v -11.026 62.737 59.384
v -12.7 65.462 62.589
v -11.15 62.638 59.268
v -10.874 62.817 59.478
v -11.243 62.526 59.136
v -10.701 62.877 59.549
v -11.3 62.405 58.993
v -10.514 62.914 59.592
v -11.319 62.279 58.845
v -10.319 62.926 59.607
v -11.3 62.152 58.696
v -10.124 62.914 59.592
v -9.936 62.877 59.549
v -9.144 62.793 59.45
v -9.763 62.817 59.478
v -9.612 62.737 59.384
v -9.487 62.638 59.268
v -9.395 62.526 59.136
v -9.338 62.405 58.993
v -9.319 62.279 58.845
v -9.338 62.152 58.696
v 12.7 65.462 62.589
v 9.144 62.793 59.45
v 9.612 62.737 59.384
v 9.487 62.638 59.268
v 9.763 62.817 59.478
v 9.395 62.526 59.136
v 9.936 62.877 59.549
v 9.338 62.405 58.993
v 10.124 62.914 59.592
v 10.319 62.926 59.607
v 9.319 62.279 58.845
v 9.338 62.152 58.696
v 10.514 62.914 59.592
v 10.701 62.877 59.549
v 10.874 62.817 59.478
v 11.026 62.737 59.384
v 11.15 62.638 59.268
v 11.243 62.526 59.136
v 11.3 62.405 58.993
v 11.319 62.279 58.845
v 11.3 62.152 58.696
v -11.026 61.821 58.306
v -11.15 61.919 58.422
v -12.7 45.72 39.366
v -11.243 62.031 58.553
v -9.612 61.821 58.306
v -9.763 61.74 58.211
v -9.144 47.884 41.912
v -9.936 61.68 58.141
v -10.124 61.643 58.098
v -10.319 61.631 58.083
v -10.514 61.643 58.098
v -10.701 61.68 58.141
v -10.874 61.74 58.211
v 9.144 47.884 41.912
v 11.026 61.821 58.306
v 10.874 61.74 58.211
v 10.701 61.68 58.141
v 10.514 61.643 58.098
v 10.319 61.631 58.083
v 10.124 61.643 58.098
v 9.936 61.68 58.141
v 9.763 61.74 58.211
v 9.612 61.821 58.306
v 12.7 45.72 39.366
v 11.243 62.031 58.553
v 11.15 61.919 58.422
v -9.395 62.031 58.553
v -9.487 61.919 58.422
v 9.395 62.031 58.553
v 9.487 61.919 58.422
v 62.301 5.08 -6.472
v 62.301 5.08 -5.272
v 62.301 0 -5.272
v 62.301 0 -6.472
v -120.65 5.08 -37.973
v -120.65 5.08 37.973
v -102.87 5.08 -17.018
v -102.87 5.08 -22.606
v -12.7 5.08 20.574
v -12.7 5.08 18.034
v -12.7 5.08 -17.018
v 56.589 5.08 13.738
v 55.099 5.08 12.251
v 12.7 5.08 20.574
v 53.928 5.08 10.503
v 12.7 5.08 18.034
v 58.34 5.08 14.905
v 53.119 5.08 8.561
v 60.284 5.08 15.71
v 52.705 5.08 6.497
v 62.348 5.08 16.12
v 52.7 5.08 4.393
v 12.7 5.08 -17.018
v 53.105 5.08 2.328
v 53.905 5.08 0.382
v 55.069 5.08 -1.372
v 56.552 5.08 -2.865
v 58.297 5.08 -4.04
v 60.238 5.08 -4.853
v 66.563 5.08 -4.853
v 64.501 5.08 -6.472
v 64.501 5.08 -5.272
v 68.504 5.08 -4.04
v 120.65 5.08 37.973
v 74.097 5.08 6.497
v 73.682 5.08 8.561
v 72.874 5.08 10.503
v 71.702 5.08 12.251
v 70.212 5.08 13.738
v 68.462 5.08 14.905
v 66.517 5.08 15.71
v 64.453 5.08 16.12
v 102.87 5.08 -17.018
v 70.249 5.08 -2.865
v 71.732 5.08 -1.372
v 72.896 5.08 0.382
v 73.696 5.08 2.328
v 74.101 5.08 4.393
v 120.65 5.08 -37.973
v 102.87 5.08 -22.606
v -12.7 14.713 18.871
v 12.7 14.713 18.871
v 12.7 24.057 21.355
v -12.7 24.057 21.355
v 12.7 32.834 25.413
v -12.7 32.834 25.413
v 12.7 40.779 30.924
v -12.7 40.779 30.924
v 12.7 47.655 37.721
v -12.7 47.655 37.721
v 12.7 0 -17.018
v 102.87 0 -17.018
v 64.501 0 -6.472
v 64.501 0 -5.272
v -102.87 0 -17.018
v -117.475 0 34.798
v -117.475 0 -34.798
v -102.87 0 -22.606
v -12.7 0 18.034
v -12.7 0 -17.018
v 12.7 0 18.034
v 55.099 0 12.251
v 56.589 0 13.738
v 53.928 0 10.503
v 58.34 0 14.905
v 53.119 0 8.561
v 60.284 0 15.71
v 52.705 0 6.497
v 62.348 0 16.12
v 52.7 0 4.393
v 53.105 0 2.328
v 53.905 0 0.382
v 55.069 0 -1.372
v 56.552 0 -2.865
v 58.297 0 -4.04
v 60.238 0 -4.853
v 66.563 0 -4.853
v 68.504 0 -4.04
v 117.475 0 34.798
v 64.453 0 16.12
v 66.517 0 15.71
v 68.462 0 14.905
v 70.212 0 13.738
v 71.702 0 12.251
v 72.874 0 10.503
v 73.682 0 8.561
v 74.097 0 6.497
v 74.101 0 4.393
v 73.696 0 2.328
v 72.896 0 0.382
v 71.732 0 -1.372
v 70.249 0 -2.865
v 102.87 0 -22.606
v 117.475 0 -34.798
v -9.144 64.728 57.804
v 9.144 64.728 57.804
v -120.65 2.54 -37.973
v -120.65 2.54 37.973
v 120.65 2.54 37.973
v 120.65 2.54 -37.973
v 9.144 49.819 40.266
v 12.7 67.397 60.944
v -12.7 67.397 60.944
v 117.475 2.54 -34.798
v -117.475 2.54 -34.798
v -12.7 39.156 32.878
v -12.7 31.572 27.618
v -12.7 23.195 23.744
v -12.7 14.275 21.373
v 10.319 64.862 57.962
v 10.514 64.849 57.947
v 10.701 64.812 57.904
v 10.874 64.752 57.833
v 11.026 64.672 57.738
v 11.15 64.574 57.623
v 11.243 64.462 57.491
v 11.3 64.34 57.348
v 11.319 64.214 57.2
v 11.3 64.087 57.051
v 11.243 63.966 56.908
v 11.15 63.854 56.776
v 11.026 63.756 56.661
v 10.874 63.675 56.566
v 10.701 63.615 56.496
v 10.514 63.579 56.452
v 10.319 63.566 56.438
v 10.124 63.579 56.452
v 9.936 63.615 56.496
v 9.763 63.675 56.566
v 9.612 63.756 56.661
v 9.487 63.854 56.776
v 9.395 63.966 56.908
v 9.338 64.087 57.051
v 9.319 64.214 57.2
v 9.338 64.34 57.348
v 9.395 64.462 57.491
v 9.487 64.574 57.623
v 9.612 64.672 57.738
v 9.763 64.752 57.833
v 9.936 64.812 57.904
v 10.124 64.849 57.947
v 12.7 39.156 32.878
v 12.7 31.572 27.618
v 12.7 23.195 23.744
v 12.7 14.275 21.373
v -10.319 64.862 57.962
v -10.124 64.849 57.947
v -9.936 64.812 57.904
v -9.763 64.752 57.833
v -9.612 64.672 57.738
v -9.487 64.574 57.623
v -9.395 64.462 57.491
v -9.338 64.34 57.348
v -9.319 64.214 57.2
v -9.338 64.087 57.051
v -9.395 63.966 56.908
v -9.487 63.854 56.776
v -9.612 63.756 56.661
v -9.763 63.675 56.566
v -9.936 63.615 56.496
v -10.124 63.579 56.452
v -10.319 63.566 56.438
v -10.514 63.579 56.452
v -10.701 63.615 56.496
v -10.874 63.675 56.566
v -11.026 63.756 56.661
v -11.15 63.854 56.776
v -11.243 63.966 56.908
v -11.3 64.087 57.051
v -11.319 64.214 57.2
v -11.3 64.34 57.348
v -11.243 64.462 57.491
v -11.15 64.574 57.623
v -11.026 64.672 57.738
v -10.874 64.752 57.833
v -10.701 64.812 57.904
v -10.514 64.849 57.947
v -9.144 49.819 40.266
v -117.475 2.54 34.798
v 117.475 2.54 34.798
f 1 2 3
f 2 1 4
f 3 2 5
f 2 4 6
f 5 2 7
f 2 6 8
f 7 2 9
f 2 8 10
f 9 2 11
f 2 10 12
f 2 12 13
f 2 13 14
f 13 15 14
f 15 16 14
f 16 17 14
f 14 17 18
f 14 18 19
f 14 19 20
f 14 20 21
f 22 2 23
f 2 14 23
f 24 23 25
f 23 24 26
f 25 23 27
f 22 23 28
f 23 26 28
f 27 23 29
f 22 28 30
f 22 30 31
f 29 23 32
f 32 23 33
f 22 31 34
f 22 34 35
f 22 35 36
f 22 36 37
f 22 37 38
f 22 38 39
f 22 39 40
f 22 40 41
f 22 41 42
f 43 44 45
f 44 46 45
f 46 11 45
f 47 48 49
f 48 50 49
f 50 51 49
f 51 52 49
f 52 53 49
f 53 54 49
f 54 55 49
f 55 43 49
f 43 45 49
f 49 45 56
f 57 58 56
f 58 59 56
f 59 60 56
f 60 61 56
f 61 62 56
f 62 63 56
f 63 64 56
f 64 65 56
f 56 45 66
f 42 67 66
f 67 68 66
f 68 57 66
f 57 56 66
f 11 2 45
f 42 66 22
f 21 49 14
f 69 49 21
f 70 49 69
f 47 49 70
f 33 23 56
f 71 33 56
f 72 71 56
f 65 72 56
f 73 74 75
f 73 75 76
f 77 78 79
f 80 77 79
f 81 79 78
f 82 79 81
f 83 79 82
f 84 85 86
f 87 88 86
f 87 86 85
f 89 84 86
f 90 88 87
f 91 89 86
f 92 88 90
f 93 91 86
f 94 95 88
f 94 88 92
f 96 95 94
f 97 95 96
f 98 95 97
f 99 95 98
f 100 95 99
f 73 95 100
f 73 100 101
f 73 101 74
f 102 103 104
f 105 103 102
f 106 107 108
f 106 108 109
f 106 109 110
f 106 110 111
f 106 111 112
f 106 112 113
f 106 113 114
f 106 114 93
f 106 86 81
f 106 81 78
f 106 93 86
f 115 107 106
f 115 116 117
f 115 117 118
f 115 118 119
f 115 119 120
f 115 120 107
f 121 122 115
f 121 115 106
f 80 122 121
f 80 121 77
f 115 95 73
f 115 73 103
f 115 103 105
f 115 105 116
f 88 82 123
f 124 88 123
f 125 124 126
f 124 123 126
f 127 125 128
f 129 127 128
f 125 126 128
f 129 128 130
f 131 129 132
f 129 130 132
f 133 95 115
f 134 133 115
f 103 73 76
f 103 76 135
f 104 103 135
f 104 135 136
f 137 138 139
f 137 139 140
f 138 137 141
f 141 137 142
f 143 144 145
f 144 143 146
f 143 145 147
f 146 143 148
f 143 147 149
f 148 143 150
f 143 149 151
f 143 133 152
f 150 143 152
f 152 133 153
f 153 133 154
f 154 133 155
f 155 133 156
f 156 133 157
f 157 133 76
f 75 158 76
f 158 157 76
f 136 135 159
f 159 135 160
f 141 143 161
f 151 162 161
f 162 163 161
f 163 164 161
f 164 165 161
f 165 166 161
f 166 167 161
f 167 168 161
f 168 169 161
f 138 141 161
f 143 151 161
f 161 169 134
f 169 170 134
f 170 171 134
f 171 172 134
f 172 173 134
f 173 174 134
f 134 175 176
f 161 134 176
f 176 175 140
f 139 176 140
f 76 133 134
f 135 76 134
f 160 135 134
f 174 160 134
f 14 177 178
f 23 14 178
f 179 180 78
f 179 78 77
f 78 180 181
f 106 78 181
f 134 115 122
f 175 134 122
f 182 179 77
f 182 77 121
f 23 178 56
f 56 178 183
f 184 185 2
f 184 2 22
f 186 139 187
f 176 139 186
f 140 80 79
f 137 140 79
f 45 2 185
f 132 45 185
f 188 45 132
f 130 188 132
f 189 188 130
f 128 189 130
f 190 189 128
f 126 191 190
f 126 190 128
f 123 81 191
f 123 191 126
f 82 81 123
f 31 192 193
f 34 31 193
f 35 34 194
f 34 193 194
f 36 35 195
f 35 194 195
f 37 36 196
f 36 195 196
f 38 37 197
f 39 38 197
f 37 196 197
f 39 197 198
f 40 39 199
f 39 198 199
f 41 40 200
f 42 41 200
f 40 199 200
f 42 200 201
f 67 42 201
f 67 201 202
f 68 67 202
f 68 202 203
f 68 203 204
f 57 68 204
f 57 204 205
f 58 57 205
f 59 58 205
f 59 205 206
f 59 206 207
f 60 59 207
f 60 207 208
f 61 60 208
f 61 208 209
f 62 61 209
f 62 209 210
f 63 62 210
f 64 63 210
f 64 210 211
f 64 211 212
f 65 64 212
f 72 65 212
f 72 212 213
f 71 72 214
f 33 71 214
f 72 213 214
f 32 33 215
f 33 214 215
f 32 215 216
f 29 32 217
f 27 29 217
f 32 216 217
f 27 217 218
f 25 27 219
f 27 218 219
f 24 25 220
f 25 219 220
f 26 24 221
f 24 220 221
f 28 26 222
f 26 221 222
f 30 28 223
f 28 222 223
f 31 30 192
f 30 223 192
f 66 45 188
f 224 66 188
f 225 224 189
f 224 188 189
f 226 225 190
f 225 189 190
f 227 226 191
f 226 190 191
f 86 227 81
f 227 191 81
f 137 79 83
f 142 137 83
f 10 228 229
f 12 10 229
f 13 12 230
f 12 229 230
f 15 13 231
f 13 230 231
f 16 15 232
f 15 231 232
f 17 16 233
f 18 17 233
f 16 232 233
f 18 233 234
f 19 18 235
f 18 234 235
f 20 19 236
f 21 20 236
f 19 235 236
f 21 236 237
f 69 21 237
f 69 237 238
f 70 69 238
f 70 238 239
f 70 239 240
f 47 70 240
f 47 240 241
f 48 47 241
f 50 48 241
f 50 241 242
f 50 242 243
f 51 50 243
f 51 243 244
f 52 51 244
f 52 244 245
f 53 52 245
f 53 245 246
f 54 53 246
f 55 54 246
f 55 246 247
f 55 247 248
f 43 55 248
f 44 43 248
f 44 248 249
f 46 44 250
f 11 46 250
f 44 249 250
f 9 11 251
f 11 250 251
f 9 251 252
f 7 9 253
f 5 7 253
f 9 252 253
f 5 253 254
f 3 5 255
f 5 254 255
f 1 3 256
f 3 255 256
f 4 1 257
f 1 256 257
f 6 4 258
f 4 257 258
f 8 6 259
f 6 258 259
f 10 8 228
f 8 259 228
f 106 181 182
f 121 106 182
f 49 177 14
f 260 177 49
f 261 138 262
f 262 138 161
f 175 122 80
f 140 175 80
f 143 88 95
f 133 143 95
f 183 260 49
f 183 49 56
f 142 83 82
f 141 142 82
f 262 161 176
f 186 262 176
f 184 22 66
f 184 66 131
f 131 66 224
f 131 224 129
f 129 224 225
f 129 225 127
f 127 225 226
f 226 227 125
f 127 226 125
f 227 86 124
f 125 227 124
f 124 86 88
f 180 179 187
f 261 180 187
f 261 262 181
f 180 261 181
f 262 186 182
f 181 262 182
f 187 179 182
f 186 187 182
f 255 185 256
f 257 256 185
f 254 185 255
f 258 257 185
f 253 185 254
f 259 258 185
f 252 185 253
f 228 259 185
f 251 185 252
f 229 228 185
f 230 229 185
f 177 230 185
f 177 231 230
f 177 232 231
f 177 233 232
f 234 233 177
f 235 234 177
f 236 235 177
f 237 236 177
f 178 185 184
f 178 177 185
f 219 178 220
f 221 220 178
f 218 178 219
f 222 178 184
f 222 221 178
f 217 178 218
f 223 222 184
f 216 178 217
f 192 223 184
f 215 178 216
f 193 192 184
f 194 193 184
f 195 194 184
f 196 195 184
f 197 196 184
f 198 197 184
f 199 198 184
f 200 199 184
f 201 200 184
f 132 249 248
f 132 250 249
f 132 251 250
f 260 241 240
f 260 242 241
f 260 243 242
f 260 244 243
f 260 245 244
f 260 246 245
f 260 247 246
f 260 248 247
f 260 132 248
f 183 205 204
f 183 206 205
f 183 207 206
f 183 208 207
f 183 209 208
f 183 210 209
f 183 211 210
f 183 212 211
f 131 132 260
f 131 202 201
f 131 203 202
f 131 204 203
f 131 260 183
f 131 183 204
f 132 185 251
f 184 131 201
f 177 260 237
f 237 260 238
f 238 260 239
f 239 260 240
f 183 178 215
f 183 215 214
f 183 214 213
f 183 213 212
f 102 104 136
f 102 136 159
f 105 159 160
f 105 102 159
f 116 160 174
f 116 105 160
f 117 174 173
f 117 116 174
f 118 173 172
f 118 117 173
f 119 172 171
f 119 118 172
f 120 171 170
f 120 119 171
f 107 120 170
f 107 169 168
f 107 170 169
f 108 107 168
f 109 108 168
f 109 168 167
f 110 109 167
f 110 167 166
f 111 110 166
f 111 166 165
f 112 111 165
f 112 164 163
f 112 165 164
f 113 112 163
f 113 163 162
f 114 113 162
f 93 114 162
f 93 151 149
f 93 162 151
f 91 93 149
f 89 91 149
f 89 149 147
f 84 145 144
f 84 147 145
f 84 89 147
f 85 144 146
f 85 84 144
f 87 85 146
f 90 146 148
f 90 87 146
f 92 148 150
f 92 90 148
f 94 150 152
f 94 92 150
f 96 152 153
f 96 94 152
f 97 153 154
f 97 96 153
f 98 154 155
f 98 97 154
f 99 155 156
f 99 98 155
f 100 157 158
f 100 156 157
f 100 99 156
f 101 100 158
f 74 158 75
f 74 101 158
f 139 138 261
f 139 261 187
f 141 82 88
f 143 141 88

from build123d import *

# Parameters (mm, degrees)
SKETCH1_W                = 234.95
SKETCH1_H                = 69.596
BOSS_EXTRUDE1_DEPTH      = 2.54
SKETCH2_W                = 241.3
SKETCH2_H                = 75.946
BOSS_EXTRUDE2_DEPTH      = 2.54
SKETCH3_W                = 25.4
SKETCH3_H                = 4.572
SKETCH3_H_2              = 30.48
CUT_EXTRUDE2_DEPTH       = 127.5866408
BOSS_EXTRUDE7_DEPTH      = 12.7
BOSS_EXTRUDE7_DEPTH_BACK = 12.7
SKETCH5_W                = 25.4
SKETCH5_H                = 2.54
BOSS_EXTRUDE8_DEPTH      = 30.48
CUT_EXTRUDE3_REACH       = 153.329
SKETCH6_W                = 18.288
SKETCH6_H                = 23.01875
CUT_EXTRUDE4_REACH       = 153.329
SKETCH9_R                = 1
CUT_EXTRUDE6_REACH       = 151.523


with BuildPart() as part:
    # Sketch1 → Boss-Extrude1 (new body)
    with BuildSketch(Plane(origin=(0, 0, 0), x_dir=(1, 0, 0), z_dir=(0, 1, 0))):
        Rectangle(SKETCH1_W, SKETCH1_H)
    extrude(amount=BOSS_EXTRUDE1_DEPTH)

    # Sketch2 → Boss-Extrude2 (add)
    with BuildSketch(Plane(origin=(0, 2.54, 0), x_dir=(1, 0, 0), z_dir=(0, 1, 0))):
        Rectangle(SKETCH2_W, SKETCH2_H)
    extrude(amount=BOSS_EXTRUDE2_DEPTH)

    # Sketch3 → Cut-Extrude2 (cut, through all)
    with BuildSketch(Plane(origin=(0, 5.08, 0), x_dir=(1, 0, 0), z_dir=(0, 1, 0))):
        Polygon((102.87, 22.606), (-102.87, 22.606), (-102.87, 17.018), (-12.7, 17.018), (12.7, 17.018), (102.87, 17.018), align=None)
        with Locations((0, 14.732)):
            Rectangle(SKETCH3_W, SKETCH3_H)
        with Locations((0, -2.794)):
            Rectangle(SKETCH3_W, SKETCH3_H_2)
    extrude(amount=-CUT_EXTRUDE2_DEPTH, mode=Mode.SUBTRACT)

    # Sketch4 → Boss-Extrude7 (add, two sides: drawn at the far end of the back side and taken through both)
    with BuildSketch(Plane(origin=(0, 0, 0), x_dir=(0, 0, -1), z_dir=(1, 0, 0)).offset(-BOSS_EXTRUDE7_DEPTH_BACK)):
        with BuildLine():
            Line((-20.574, 5.08), (-18.034, 5.08))
            ThreePointArc((-18.034, 5.08), (-23.194025065, 28.533326897), (-37.721134665, 47.655238095))
            Line((-37.721134665, 47.655238095), (-39.366264908, 45.72))
            ThreePointArc((-39.366264908, 45.72), (-25.499478471, 27.467266584), (-20.574, 5.08))
        make_face()
    extrude(amount=BOSS_EXTRUDE7_DEPTH + BOSS_EXTRUDE7_DEPTH_BACK)

    # Sketch5 → Boss-Extrude8 (add)
    with BuildSketch(Plane(origin=(0, 38.605953422, 45.413858329), x_dir=(1, 0, 0), z_dir=(0, 0.6476890718445453, 0.7619047619047618))):
        with Locations((0, 10.607186134)):
            Rectangle(SKETCH5_W, SKETCH5_H)
    extrude(amount=BOSS_EXTRUDE8_DEPTH)

    # Sketch6 → Cut-Extrude3 (cut, up to next)
    with BuildSketch(Plane(origin=(0, 9.049284674, -7.692723663), x_dir=(1, 0, 0), z_dir=(0, 0.7619047619047616, -0.6476890718445452)), mode=Mode.PRIVATE) as cut_extrude3_sk1:
        with Locations((0, -74.455715595)):
            Rectangle(SKETCH6_W, SKETCH6_H)
    cut_extrude3_tool1 = extrude(cut_extrude3_sk1.sketch, amount=-CUT_EXTRUDE3_REACH, mode=Mode.PRIVATE) & part.part
    add(cut_extrude3_tool1.solids().sort_by_distance((0, 57.273438, 49.035441))[0], mode=Mode.SUBTRACT)

    # Sketch9 → Cut-Extrude4 (cut, up to next)
    with BuildSketch(Plane(origin=(0, 9.049284674, -7.692723663), x_dir=(1, 0, 0), z_dir=(0, 0.7619047619047616, -0.6476890718445452)), mode=Mode.PRIVATE) as cut_extrude4_sk1:
        with Locations(Location((-10.31875, -85.171340595, 0), (0, 0, 270))):
            Circle(SKETCH9_R)
    cut_extrude4_tool1 = extrude(cut_extrude4_sk1.sketch, amount=-CUT_EXTRUDE4_REACH, mode=Mode.PRIVATE) & part.part
    # Sketch9 → Cut-Extrude4 (cut, up to next)
    with BuildSketch(Plane(origin=(0, 9.049284674, -7.692723663), x_dir=(1, 0, 0), z_dir=(0, 0.7619047619047616, -0.6476890718445452)), mode=Mode.PRIVATE) as cut_extrude4_sk2:
        with Locations(Location((10.31875, -85.171340595, 0), (0, 0, 270))):
            Circle(SKETCH9_R)
    cut_extrude4_tool2 = extrude(cut_extrude4_sk2.sketch, amount=-CUT_EXTRUDE4_REACH, mode=Mode.PRIVATE) & part.part
    add(cut_extrude4_tool1.solids().sort_by_distance((-10.31875, 64.213831, 57.199726))[0], mode=Mode.SUBTRACT)
    add(cut_extrude4_tool2.solids().sort_by_distance((10.31875, 64.213831, 57.199726))[0], mode=Mode.SUBTRACT)

    # Sketch10 → Cut-Extrude6 (cut, up to next)
    with BuildSketch(Plane(origin=(0, 5.08, 0), x_dir=(1, 0, 0), z_dir=(0, 1, 0)), mode=Mode.PRIVATE) as cut_extrude6_sk1:
        with BuildLine():
            Line((62.300670098, 6.472268969), (64.500670098, 6.472268969))
            Line((64.500670098, 6.472268969), (64.500670098, 5.272268969))
            ThreePointArc((64.500670098, 5.272268969), (63.400670098, -16.171303867), (62.300670098, 5.272268969))
            Line((62.300670098, 5.272268969), (62.300670098, 6.472268969))
        make_face()
    cut_extrude6_tool1 = extrude(cut_extrude6_sk1.sketch, amount=-CUT_EXTRUDE6_REACH, mode=Mode.PRIVATE) & part.part
    add(cut_extrude6_tool1.solids().sort_by_distance((63.40067, 5.08, 5.342182))[0], mode=Mode.SUBTRACT)


solid = part.part
